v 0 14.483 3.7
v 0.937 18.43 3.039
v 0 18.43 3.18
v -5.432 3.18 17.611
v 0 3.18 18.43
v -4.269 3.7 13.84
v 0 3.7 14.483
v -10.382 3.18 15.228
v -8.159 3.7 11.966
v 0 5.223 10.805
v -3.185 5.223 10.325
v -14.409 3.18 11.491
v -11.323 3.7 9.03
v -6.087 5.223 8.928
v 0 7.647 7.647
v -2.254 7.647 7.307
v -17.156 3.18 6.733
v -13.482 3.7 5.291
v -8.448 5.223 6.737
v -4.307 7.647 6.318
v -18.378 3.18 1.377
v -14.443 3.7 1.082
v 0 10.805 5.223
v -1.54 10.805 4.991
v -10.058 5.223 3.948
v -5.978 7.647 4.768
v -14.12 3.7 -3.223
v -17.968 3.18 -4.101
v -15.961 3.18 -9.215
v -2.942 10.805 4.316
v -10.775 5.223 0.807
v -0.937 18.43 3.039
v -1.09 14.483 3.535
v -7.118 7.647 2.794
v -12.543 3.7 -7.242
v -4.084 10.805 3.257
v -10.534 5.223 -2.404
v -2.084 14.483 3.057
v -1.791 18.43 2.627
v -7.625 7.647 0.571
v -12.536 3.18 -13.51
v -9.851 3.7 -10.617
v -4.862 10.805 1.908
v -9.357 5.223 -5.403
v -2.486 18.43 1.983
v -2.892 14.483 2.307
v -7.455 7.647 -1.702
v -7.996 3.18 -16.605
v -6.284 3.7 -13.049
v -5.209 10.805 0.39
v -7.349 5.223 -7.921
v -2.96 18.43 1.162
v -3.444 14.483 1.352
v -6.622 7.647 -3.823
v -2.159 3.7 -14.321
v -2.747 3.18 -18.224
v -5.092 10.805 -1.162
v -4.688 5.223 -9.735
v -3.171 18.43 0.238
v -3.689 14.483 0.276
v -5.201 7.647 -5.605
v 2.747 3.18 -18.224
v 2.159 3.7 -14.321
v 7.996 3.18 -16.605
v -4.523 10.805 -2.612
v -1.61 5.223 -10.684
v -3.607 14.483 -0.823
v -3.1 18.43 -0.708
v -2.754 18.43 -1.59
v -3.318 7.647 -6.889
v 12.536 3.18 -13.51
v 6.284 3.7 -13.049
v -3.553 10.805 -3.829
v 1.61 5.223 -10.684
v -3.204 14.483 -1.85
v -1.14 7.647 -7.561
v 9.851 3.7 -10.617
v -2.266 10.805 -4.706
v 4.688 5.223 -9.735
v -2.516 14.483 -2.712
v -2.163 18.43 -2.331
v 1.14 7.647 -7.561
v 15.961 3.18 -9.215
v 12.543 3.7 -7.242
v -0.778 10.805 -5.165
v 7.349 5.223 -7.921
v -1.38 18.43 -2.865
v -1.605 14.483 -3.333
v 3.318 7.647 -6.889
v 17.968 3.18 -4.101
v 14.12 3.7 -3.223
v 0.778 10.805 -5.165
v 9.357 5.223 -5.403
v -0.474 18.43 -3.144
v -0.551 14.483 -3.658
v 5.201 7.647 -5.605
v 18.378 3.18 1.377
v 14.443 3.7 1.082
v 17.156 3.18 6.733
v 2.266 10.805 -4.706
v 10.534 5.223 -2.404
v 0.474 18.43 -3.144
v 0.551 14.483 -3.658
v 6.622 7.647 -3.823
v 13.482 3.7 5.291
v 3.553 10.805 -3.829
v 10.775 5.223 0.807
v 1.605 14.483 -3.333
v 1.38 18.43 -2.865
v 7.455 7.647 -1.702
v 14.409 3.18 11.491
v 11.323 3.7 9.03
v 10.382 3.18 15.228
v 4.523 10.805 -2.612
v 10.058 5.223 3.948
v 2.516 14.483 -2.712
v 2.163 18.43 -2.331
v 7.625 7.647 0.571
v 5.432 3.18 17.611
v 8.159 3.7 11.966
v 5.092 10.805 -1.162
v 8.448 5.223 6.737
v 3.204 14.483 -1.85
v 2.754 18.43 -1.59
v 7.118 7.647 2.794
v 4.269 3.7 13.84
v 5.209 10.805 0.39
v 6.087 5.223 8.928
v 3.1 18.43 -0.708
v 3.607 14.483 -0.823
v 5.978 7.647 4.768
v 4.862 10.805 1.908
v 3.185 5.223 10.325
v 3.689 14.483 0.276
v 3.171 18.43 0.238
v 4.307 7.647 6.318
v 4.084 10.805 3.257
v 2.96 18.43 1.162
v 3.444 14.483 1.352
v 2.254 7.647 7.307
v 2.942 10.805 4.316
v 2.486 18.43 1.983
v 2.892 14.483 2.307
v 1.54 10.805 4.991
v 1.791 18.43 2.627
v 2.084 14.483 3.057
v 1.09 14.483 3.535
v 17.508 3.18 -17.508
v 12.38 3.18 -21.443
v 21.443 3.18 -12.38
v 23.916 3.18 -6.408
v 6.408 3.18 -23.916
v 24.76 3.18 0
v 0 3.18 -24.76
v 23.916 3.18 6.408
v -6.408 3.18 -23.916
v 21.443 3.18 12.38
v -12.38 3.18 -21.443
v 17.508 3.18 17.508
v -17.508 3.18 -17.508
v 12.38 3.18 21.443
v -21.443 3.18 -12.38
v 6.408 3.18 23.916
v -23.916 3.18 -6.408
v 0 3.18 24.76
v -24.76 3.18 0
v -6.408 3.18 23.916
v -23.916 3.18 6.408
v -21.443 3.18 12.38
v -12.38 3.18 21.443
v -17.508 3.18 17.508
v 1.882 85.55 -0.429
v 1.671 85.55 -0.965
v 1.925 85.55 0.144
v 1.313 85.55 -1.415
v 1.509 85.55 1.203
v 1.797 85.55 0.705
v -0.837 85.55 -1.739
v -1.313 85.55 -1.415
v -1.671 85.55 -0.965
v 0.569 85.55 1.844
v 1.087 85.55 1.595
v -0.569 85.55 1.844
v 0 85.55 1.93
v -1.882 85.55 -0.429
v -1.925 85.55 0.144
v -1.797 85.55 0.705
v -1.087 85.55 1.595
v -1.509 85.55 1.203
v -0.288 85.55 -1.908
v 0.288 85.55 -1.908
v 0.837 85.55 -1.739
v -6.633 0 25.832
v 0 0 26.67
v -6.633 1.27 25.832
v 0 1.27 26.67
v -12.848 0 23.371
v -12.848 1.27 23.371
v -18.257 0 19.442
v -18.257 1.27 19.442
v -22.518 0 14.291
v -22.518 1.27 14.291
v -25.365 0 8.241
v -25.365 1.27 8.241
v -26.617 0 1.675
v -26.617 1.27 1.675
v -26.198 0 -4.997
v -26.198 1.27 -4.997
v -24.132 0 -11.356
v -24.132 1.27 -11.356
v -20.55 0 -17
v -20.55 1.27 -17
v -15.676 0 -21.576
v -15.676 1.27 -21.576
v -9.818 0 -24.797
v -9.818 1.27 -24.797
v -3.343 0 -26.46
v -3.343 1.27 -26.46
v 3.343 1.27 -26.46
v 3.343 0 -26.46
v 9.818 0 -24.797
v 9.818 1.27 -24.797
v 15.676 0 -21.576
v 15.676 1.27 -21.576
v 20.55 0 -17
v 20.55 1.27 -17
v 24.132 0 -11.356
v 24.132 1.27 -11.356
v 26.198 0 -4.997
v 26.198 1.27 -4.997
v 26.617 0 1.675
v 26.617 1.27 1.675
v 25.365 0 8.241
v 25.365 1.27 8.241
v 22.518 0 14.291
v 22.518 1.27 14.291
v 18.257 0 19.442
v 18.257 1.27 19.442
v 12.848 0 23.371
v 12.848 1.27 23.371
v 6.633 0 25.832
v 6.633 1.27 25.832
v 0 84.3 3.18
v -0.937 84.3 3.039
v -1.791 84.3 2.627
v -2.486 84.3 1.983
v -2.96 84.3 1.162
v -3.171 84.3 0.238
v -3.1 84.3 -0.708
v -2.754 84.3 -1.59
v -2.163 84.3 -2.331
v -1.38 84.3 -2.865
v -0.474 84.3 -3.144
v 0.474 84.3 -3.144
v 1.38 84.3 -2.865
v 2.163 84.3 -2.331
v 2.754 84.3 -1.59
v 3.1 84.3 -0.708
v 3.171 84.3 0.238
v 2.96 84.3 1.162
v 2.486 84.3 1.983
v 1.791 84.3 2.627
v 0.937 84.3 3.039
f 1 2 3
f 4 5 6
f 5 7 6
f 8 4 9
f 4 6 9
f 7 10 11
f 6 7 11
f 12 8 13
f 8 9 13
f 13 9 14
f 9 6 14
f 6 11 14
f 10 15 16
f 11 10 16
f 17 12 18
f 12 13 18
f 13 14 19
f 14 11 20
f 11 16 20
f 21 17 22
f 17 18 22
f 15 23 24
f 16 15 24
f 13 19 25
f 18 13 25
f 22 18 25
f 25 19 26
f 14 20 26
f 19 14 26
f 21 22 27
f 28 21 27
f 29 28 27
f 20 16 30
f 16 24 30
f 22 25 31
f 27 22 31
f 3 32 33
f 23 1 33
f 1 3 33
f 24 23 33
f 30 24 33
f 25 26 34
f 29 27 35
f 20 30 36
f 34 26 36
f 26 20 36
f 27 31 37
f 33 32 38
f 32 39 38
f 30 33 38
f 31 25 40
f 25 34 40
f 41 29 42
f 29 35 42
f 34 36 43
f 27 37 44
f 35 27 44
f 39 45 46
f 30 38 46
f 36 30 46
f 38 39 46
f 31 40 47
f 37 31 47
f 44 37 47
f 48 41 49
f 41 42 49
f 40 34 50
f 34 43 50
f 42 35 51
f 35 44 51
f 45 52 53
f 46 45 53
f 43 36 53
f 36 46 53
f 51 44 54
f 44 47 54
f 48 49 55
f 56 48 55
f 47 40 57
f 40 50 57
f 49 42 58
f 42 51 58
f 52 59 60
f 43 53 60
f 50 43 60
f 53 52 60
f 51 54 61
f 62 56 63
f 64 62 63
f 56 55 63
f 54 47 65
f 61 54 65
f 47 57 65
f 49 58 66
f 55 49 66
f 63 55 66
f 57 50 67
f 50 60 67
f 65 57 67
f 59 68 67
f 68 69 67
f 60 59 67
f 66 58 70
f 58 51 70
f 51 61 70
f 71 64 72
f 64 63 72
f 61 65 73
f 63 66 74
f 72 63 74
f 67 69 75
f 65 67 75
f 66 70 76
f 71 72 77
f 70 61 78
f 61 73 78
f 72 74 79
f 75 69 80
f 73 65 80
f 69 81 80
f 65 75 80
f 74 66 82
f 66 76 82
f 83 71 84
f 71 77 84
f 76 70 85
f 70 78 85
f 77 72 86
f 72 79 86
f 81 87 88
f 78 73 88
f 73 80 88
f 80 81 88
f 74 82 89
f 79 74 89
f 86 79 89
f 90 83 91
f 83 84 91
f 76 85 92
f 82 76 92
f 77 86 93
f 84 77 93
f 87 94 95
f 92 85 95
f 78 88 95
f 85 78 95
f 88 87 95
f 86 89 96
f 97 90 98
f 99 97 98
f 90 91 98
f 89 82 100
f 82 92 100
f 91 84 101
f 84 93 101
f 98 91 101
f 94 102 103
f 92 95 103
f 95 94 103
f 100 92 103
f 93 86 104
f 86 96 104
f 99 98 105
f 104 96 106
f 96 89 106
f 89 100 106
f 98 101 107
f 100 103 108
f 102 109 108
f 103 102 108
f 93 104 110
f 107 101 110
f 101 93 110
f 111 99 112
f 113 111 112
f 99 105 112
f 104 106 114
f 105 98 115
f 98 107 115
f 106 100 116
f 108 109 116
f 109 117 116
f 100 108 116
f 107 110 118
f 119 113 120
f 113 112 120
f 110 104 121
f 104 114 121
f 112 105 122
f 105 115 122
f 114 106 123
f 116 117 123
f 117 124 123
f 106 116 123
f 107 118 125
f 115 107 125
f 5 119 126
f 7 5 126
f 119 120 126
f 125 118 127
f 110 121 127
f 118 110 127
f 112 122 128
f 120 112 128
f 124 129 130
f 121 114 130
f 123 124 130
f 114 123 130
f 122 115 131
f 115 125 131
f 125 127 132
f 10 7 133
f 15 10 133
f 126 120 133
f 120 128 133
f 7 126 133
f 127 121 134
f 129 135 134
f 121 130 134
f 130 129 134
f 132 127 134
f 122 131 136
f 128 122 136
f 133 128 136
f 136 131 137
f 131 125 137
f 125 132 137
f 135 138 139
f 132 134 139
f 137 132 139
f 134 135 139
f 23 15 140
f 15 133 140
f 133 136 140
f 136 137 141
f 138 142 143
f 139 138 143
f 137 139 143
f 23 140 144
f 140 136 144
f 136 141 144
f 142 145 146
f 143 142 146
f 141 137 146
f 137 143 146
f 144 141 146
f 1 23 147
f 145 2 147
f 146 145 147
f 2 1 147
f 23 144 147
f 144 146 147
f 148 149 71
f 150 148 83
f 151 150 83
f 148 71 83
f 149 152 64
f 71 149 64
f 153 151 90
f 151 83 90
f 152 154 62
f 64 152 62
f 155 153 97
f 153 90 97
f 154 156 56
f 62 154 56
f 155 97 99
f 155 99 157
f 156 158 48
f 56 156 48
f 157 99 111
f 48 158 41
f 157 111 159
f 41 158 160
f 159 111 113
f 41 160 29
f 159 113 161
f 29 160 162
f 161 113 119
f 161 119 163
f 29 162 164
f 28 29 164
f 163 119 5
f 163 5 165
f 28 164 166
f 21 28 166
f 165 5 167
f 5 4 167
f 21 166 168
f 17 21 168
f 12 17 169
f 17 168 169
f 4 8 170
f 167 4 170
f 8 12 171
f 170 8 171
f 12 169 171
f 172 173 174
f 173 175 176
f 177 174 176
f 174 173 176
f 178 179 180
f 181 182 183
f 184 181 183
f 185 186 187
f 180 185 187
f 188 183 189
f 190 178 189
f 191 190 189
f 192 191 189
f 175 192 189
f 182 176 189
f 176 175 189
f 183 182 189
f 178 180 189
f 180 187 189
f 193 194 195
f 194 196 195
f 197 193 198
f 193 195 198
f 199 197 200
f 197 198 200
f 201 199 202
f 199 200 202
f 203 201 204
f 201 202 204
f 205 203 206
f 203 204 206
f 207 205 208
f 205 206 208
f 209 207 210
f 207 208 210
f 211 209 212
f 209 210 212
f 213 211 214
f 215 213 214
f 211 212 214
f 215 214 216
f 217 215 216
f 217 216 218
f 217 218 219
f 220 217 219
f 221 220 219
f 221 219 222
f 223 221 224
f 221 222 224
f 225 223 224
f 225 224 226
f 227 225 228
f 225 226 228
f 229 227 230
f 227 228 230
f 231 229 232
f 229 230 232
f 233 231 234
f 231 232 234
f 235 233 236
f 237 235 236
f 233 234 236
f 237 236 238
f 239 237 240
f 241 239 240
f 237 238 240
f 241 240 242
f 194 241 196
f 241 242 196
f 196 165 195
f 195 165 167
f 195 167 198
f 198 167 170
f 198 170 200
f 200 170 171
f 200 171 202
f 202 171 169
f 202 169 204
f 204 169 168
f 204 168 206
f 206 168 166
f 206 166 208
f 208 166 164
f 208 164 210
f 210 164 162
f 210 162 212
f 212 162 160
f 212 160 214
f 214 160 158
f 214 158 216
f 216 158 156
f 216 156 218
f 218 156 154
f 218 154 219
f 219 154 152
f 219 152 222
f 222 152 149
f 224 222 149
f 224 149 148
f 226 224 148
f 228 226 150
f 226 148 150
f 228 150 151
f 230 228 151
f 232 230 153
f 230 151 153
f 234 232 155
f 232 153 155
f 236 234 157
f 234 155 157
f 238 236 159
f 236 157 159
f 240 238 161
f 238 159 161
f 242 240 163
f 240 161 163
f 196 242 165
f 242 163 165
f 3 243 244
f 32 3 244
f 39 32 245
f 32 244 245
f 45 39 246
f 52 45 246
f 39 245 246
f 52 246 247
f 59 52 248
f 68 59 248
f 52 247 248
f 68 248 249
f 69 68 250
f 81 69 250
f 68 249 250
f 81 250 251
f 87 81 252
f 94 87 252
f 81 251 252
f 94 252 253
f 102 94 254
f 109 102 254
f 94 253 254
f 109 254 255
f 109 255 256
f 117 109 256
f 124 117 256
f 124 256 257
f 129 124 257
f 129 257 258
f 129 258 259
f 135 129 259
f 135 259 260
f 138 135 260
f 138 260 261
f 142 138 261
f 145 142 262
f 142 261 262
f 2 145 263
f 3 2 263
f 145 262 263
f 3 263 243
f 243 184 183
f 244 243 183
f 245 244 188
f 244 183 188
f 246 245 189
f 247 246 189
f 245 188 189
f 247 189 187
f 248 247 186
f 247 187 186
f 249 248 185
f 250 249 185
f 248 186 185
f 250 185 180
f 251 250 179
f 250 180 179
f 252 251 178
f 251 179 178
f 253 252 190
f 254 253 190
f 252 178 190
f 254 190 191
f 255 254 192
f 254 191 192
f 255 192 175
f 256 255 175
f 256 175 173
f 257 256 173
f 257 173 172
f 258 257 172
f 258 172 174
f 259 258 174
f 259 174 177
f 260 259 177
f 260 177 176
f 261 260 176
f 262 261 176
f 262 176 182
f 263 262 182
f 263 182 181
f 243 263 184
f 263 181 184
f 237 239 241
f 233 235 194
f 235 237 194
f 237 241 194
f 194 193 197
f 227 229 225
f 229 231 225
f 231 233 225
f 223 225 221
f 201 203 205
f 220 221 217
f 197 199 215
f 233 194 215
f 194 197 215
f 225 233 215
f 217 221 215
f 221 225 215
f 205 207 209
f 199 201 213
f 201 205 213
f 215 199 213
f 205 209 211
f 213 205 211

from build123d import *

# Parameters (mm, degrees)
SKETCH1_W     = 26.67
SKETCH1_H     = 1.27
CHAMFER1_SIZE = 1.25


with BuildPart() as part:
    # Sketch1 → Revolve1 (revolve)
    with BuildSketch(Plane.XY, mode=Mode.PRIVATE) as revolve1_sk:
        with Locations((13.335, 0.635)):
            Rectangle(SKETCH1_W, SKETCH1_H)
        with BuildLine():
            Line((3.18, 85.55), (0, 85.55))
            Line((0, 85.55), (0, 1.27))
            Line((0, 1.27), (26.67, 1.27))
            Line((26.67, 1.27), (24.76, 3.18))
            Line((24.76, 3.18), (18.43, 3.18))
            ThreePointArc((18.43, 3.18), (7.646621587, 7.646621587), (3.18, 18.43))
            Line((3.18, 18.43), (3.18, 85.55))
        make_face()
    revolve(revolve1_sk.sketch.rotate(Axis((0, 91.878860224, 0), (0, -1, 0)), 90), axis=Axis((0, 91.878860224, 0), (0, -1, 0)))

    # Chamfer1
    chamfer1_edges = [part.edges().sort_by_distance(p)[0] for p in [
        (0, 85.55, -3.18),
    ]]
    chamfer(chamfer1_edges, length=CHAMFER1_SIZE)


solid = part.part
